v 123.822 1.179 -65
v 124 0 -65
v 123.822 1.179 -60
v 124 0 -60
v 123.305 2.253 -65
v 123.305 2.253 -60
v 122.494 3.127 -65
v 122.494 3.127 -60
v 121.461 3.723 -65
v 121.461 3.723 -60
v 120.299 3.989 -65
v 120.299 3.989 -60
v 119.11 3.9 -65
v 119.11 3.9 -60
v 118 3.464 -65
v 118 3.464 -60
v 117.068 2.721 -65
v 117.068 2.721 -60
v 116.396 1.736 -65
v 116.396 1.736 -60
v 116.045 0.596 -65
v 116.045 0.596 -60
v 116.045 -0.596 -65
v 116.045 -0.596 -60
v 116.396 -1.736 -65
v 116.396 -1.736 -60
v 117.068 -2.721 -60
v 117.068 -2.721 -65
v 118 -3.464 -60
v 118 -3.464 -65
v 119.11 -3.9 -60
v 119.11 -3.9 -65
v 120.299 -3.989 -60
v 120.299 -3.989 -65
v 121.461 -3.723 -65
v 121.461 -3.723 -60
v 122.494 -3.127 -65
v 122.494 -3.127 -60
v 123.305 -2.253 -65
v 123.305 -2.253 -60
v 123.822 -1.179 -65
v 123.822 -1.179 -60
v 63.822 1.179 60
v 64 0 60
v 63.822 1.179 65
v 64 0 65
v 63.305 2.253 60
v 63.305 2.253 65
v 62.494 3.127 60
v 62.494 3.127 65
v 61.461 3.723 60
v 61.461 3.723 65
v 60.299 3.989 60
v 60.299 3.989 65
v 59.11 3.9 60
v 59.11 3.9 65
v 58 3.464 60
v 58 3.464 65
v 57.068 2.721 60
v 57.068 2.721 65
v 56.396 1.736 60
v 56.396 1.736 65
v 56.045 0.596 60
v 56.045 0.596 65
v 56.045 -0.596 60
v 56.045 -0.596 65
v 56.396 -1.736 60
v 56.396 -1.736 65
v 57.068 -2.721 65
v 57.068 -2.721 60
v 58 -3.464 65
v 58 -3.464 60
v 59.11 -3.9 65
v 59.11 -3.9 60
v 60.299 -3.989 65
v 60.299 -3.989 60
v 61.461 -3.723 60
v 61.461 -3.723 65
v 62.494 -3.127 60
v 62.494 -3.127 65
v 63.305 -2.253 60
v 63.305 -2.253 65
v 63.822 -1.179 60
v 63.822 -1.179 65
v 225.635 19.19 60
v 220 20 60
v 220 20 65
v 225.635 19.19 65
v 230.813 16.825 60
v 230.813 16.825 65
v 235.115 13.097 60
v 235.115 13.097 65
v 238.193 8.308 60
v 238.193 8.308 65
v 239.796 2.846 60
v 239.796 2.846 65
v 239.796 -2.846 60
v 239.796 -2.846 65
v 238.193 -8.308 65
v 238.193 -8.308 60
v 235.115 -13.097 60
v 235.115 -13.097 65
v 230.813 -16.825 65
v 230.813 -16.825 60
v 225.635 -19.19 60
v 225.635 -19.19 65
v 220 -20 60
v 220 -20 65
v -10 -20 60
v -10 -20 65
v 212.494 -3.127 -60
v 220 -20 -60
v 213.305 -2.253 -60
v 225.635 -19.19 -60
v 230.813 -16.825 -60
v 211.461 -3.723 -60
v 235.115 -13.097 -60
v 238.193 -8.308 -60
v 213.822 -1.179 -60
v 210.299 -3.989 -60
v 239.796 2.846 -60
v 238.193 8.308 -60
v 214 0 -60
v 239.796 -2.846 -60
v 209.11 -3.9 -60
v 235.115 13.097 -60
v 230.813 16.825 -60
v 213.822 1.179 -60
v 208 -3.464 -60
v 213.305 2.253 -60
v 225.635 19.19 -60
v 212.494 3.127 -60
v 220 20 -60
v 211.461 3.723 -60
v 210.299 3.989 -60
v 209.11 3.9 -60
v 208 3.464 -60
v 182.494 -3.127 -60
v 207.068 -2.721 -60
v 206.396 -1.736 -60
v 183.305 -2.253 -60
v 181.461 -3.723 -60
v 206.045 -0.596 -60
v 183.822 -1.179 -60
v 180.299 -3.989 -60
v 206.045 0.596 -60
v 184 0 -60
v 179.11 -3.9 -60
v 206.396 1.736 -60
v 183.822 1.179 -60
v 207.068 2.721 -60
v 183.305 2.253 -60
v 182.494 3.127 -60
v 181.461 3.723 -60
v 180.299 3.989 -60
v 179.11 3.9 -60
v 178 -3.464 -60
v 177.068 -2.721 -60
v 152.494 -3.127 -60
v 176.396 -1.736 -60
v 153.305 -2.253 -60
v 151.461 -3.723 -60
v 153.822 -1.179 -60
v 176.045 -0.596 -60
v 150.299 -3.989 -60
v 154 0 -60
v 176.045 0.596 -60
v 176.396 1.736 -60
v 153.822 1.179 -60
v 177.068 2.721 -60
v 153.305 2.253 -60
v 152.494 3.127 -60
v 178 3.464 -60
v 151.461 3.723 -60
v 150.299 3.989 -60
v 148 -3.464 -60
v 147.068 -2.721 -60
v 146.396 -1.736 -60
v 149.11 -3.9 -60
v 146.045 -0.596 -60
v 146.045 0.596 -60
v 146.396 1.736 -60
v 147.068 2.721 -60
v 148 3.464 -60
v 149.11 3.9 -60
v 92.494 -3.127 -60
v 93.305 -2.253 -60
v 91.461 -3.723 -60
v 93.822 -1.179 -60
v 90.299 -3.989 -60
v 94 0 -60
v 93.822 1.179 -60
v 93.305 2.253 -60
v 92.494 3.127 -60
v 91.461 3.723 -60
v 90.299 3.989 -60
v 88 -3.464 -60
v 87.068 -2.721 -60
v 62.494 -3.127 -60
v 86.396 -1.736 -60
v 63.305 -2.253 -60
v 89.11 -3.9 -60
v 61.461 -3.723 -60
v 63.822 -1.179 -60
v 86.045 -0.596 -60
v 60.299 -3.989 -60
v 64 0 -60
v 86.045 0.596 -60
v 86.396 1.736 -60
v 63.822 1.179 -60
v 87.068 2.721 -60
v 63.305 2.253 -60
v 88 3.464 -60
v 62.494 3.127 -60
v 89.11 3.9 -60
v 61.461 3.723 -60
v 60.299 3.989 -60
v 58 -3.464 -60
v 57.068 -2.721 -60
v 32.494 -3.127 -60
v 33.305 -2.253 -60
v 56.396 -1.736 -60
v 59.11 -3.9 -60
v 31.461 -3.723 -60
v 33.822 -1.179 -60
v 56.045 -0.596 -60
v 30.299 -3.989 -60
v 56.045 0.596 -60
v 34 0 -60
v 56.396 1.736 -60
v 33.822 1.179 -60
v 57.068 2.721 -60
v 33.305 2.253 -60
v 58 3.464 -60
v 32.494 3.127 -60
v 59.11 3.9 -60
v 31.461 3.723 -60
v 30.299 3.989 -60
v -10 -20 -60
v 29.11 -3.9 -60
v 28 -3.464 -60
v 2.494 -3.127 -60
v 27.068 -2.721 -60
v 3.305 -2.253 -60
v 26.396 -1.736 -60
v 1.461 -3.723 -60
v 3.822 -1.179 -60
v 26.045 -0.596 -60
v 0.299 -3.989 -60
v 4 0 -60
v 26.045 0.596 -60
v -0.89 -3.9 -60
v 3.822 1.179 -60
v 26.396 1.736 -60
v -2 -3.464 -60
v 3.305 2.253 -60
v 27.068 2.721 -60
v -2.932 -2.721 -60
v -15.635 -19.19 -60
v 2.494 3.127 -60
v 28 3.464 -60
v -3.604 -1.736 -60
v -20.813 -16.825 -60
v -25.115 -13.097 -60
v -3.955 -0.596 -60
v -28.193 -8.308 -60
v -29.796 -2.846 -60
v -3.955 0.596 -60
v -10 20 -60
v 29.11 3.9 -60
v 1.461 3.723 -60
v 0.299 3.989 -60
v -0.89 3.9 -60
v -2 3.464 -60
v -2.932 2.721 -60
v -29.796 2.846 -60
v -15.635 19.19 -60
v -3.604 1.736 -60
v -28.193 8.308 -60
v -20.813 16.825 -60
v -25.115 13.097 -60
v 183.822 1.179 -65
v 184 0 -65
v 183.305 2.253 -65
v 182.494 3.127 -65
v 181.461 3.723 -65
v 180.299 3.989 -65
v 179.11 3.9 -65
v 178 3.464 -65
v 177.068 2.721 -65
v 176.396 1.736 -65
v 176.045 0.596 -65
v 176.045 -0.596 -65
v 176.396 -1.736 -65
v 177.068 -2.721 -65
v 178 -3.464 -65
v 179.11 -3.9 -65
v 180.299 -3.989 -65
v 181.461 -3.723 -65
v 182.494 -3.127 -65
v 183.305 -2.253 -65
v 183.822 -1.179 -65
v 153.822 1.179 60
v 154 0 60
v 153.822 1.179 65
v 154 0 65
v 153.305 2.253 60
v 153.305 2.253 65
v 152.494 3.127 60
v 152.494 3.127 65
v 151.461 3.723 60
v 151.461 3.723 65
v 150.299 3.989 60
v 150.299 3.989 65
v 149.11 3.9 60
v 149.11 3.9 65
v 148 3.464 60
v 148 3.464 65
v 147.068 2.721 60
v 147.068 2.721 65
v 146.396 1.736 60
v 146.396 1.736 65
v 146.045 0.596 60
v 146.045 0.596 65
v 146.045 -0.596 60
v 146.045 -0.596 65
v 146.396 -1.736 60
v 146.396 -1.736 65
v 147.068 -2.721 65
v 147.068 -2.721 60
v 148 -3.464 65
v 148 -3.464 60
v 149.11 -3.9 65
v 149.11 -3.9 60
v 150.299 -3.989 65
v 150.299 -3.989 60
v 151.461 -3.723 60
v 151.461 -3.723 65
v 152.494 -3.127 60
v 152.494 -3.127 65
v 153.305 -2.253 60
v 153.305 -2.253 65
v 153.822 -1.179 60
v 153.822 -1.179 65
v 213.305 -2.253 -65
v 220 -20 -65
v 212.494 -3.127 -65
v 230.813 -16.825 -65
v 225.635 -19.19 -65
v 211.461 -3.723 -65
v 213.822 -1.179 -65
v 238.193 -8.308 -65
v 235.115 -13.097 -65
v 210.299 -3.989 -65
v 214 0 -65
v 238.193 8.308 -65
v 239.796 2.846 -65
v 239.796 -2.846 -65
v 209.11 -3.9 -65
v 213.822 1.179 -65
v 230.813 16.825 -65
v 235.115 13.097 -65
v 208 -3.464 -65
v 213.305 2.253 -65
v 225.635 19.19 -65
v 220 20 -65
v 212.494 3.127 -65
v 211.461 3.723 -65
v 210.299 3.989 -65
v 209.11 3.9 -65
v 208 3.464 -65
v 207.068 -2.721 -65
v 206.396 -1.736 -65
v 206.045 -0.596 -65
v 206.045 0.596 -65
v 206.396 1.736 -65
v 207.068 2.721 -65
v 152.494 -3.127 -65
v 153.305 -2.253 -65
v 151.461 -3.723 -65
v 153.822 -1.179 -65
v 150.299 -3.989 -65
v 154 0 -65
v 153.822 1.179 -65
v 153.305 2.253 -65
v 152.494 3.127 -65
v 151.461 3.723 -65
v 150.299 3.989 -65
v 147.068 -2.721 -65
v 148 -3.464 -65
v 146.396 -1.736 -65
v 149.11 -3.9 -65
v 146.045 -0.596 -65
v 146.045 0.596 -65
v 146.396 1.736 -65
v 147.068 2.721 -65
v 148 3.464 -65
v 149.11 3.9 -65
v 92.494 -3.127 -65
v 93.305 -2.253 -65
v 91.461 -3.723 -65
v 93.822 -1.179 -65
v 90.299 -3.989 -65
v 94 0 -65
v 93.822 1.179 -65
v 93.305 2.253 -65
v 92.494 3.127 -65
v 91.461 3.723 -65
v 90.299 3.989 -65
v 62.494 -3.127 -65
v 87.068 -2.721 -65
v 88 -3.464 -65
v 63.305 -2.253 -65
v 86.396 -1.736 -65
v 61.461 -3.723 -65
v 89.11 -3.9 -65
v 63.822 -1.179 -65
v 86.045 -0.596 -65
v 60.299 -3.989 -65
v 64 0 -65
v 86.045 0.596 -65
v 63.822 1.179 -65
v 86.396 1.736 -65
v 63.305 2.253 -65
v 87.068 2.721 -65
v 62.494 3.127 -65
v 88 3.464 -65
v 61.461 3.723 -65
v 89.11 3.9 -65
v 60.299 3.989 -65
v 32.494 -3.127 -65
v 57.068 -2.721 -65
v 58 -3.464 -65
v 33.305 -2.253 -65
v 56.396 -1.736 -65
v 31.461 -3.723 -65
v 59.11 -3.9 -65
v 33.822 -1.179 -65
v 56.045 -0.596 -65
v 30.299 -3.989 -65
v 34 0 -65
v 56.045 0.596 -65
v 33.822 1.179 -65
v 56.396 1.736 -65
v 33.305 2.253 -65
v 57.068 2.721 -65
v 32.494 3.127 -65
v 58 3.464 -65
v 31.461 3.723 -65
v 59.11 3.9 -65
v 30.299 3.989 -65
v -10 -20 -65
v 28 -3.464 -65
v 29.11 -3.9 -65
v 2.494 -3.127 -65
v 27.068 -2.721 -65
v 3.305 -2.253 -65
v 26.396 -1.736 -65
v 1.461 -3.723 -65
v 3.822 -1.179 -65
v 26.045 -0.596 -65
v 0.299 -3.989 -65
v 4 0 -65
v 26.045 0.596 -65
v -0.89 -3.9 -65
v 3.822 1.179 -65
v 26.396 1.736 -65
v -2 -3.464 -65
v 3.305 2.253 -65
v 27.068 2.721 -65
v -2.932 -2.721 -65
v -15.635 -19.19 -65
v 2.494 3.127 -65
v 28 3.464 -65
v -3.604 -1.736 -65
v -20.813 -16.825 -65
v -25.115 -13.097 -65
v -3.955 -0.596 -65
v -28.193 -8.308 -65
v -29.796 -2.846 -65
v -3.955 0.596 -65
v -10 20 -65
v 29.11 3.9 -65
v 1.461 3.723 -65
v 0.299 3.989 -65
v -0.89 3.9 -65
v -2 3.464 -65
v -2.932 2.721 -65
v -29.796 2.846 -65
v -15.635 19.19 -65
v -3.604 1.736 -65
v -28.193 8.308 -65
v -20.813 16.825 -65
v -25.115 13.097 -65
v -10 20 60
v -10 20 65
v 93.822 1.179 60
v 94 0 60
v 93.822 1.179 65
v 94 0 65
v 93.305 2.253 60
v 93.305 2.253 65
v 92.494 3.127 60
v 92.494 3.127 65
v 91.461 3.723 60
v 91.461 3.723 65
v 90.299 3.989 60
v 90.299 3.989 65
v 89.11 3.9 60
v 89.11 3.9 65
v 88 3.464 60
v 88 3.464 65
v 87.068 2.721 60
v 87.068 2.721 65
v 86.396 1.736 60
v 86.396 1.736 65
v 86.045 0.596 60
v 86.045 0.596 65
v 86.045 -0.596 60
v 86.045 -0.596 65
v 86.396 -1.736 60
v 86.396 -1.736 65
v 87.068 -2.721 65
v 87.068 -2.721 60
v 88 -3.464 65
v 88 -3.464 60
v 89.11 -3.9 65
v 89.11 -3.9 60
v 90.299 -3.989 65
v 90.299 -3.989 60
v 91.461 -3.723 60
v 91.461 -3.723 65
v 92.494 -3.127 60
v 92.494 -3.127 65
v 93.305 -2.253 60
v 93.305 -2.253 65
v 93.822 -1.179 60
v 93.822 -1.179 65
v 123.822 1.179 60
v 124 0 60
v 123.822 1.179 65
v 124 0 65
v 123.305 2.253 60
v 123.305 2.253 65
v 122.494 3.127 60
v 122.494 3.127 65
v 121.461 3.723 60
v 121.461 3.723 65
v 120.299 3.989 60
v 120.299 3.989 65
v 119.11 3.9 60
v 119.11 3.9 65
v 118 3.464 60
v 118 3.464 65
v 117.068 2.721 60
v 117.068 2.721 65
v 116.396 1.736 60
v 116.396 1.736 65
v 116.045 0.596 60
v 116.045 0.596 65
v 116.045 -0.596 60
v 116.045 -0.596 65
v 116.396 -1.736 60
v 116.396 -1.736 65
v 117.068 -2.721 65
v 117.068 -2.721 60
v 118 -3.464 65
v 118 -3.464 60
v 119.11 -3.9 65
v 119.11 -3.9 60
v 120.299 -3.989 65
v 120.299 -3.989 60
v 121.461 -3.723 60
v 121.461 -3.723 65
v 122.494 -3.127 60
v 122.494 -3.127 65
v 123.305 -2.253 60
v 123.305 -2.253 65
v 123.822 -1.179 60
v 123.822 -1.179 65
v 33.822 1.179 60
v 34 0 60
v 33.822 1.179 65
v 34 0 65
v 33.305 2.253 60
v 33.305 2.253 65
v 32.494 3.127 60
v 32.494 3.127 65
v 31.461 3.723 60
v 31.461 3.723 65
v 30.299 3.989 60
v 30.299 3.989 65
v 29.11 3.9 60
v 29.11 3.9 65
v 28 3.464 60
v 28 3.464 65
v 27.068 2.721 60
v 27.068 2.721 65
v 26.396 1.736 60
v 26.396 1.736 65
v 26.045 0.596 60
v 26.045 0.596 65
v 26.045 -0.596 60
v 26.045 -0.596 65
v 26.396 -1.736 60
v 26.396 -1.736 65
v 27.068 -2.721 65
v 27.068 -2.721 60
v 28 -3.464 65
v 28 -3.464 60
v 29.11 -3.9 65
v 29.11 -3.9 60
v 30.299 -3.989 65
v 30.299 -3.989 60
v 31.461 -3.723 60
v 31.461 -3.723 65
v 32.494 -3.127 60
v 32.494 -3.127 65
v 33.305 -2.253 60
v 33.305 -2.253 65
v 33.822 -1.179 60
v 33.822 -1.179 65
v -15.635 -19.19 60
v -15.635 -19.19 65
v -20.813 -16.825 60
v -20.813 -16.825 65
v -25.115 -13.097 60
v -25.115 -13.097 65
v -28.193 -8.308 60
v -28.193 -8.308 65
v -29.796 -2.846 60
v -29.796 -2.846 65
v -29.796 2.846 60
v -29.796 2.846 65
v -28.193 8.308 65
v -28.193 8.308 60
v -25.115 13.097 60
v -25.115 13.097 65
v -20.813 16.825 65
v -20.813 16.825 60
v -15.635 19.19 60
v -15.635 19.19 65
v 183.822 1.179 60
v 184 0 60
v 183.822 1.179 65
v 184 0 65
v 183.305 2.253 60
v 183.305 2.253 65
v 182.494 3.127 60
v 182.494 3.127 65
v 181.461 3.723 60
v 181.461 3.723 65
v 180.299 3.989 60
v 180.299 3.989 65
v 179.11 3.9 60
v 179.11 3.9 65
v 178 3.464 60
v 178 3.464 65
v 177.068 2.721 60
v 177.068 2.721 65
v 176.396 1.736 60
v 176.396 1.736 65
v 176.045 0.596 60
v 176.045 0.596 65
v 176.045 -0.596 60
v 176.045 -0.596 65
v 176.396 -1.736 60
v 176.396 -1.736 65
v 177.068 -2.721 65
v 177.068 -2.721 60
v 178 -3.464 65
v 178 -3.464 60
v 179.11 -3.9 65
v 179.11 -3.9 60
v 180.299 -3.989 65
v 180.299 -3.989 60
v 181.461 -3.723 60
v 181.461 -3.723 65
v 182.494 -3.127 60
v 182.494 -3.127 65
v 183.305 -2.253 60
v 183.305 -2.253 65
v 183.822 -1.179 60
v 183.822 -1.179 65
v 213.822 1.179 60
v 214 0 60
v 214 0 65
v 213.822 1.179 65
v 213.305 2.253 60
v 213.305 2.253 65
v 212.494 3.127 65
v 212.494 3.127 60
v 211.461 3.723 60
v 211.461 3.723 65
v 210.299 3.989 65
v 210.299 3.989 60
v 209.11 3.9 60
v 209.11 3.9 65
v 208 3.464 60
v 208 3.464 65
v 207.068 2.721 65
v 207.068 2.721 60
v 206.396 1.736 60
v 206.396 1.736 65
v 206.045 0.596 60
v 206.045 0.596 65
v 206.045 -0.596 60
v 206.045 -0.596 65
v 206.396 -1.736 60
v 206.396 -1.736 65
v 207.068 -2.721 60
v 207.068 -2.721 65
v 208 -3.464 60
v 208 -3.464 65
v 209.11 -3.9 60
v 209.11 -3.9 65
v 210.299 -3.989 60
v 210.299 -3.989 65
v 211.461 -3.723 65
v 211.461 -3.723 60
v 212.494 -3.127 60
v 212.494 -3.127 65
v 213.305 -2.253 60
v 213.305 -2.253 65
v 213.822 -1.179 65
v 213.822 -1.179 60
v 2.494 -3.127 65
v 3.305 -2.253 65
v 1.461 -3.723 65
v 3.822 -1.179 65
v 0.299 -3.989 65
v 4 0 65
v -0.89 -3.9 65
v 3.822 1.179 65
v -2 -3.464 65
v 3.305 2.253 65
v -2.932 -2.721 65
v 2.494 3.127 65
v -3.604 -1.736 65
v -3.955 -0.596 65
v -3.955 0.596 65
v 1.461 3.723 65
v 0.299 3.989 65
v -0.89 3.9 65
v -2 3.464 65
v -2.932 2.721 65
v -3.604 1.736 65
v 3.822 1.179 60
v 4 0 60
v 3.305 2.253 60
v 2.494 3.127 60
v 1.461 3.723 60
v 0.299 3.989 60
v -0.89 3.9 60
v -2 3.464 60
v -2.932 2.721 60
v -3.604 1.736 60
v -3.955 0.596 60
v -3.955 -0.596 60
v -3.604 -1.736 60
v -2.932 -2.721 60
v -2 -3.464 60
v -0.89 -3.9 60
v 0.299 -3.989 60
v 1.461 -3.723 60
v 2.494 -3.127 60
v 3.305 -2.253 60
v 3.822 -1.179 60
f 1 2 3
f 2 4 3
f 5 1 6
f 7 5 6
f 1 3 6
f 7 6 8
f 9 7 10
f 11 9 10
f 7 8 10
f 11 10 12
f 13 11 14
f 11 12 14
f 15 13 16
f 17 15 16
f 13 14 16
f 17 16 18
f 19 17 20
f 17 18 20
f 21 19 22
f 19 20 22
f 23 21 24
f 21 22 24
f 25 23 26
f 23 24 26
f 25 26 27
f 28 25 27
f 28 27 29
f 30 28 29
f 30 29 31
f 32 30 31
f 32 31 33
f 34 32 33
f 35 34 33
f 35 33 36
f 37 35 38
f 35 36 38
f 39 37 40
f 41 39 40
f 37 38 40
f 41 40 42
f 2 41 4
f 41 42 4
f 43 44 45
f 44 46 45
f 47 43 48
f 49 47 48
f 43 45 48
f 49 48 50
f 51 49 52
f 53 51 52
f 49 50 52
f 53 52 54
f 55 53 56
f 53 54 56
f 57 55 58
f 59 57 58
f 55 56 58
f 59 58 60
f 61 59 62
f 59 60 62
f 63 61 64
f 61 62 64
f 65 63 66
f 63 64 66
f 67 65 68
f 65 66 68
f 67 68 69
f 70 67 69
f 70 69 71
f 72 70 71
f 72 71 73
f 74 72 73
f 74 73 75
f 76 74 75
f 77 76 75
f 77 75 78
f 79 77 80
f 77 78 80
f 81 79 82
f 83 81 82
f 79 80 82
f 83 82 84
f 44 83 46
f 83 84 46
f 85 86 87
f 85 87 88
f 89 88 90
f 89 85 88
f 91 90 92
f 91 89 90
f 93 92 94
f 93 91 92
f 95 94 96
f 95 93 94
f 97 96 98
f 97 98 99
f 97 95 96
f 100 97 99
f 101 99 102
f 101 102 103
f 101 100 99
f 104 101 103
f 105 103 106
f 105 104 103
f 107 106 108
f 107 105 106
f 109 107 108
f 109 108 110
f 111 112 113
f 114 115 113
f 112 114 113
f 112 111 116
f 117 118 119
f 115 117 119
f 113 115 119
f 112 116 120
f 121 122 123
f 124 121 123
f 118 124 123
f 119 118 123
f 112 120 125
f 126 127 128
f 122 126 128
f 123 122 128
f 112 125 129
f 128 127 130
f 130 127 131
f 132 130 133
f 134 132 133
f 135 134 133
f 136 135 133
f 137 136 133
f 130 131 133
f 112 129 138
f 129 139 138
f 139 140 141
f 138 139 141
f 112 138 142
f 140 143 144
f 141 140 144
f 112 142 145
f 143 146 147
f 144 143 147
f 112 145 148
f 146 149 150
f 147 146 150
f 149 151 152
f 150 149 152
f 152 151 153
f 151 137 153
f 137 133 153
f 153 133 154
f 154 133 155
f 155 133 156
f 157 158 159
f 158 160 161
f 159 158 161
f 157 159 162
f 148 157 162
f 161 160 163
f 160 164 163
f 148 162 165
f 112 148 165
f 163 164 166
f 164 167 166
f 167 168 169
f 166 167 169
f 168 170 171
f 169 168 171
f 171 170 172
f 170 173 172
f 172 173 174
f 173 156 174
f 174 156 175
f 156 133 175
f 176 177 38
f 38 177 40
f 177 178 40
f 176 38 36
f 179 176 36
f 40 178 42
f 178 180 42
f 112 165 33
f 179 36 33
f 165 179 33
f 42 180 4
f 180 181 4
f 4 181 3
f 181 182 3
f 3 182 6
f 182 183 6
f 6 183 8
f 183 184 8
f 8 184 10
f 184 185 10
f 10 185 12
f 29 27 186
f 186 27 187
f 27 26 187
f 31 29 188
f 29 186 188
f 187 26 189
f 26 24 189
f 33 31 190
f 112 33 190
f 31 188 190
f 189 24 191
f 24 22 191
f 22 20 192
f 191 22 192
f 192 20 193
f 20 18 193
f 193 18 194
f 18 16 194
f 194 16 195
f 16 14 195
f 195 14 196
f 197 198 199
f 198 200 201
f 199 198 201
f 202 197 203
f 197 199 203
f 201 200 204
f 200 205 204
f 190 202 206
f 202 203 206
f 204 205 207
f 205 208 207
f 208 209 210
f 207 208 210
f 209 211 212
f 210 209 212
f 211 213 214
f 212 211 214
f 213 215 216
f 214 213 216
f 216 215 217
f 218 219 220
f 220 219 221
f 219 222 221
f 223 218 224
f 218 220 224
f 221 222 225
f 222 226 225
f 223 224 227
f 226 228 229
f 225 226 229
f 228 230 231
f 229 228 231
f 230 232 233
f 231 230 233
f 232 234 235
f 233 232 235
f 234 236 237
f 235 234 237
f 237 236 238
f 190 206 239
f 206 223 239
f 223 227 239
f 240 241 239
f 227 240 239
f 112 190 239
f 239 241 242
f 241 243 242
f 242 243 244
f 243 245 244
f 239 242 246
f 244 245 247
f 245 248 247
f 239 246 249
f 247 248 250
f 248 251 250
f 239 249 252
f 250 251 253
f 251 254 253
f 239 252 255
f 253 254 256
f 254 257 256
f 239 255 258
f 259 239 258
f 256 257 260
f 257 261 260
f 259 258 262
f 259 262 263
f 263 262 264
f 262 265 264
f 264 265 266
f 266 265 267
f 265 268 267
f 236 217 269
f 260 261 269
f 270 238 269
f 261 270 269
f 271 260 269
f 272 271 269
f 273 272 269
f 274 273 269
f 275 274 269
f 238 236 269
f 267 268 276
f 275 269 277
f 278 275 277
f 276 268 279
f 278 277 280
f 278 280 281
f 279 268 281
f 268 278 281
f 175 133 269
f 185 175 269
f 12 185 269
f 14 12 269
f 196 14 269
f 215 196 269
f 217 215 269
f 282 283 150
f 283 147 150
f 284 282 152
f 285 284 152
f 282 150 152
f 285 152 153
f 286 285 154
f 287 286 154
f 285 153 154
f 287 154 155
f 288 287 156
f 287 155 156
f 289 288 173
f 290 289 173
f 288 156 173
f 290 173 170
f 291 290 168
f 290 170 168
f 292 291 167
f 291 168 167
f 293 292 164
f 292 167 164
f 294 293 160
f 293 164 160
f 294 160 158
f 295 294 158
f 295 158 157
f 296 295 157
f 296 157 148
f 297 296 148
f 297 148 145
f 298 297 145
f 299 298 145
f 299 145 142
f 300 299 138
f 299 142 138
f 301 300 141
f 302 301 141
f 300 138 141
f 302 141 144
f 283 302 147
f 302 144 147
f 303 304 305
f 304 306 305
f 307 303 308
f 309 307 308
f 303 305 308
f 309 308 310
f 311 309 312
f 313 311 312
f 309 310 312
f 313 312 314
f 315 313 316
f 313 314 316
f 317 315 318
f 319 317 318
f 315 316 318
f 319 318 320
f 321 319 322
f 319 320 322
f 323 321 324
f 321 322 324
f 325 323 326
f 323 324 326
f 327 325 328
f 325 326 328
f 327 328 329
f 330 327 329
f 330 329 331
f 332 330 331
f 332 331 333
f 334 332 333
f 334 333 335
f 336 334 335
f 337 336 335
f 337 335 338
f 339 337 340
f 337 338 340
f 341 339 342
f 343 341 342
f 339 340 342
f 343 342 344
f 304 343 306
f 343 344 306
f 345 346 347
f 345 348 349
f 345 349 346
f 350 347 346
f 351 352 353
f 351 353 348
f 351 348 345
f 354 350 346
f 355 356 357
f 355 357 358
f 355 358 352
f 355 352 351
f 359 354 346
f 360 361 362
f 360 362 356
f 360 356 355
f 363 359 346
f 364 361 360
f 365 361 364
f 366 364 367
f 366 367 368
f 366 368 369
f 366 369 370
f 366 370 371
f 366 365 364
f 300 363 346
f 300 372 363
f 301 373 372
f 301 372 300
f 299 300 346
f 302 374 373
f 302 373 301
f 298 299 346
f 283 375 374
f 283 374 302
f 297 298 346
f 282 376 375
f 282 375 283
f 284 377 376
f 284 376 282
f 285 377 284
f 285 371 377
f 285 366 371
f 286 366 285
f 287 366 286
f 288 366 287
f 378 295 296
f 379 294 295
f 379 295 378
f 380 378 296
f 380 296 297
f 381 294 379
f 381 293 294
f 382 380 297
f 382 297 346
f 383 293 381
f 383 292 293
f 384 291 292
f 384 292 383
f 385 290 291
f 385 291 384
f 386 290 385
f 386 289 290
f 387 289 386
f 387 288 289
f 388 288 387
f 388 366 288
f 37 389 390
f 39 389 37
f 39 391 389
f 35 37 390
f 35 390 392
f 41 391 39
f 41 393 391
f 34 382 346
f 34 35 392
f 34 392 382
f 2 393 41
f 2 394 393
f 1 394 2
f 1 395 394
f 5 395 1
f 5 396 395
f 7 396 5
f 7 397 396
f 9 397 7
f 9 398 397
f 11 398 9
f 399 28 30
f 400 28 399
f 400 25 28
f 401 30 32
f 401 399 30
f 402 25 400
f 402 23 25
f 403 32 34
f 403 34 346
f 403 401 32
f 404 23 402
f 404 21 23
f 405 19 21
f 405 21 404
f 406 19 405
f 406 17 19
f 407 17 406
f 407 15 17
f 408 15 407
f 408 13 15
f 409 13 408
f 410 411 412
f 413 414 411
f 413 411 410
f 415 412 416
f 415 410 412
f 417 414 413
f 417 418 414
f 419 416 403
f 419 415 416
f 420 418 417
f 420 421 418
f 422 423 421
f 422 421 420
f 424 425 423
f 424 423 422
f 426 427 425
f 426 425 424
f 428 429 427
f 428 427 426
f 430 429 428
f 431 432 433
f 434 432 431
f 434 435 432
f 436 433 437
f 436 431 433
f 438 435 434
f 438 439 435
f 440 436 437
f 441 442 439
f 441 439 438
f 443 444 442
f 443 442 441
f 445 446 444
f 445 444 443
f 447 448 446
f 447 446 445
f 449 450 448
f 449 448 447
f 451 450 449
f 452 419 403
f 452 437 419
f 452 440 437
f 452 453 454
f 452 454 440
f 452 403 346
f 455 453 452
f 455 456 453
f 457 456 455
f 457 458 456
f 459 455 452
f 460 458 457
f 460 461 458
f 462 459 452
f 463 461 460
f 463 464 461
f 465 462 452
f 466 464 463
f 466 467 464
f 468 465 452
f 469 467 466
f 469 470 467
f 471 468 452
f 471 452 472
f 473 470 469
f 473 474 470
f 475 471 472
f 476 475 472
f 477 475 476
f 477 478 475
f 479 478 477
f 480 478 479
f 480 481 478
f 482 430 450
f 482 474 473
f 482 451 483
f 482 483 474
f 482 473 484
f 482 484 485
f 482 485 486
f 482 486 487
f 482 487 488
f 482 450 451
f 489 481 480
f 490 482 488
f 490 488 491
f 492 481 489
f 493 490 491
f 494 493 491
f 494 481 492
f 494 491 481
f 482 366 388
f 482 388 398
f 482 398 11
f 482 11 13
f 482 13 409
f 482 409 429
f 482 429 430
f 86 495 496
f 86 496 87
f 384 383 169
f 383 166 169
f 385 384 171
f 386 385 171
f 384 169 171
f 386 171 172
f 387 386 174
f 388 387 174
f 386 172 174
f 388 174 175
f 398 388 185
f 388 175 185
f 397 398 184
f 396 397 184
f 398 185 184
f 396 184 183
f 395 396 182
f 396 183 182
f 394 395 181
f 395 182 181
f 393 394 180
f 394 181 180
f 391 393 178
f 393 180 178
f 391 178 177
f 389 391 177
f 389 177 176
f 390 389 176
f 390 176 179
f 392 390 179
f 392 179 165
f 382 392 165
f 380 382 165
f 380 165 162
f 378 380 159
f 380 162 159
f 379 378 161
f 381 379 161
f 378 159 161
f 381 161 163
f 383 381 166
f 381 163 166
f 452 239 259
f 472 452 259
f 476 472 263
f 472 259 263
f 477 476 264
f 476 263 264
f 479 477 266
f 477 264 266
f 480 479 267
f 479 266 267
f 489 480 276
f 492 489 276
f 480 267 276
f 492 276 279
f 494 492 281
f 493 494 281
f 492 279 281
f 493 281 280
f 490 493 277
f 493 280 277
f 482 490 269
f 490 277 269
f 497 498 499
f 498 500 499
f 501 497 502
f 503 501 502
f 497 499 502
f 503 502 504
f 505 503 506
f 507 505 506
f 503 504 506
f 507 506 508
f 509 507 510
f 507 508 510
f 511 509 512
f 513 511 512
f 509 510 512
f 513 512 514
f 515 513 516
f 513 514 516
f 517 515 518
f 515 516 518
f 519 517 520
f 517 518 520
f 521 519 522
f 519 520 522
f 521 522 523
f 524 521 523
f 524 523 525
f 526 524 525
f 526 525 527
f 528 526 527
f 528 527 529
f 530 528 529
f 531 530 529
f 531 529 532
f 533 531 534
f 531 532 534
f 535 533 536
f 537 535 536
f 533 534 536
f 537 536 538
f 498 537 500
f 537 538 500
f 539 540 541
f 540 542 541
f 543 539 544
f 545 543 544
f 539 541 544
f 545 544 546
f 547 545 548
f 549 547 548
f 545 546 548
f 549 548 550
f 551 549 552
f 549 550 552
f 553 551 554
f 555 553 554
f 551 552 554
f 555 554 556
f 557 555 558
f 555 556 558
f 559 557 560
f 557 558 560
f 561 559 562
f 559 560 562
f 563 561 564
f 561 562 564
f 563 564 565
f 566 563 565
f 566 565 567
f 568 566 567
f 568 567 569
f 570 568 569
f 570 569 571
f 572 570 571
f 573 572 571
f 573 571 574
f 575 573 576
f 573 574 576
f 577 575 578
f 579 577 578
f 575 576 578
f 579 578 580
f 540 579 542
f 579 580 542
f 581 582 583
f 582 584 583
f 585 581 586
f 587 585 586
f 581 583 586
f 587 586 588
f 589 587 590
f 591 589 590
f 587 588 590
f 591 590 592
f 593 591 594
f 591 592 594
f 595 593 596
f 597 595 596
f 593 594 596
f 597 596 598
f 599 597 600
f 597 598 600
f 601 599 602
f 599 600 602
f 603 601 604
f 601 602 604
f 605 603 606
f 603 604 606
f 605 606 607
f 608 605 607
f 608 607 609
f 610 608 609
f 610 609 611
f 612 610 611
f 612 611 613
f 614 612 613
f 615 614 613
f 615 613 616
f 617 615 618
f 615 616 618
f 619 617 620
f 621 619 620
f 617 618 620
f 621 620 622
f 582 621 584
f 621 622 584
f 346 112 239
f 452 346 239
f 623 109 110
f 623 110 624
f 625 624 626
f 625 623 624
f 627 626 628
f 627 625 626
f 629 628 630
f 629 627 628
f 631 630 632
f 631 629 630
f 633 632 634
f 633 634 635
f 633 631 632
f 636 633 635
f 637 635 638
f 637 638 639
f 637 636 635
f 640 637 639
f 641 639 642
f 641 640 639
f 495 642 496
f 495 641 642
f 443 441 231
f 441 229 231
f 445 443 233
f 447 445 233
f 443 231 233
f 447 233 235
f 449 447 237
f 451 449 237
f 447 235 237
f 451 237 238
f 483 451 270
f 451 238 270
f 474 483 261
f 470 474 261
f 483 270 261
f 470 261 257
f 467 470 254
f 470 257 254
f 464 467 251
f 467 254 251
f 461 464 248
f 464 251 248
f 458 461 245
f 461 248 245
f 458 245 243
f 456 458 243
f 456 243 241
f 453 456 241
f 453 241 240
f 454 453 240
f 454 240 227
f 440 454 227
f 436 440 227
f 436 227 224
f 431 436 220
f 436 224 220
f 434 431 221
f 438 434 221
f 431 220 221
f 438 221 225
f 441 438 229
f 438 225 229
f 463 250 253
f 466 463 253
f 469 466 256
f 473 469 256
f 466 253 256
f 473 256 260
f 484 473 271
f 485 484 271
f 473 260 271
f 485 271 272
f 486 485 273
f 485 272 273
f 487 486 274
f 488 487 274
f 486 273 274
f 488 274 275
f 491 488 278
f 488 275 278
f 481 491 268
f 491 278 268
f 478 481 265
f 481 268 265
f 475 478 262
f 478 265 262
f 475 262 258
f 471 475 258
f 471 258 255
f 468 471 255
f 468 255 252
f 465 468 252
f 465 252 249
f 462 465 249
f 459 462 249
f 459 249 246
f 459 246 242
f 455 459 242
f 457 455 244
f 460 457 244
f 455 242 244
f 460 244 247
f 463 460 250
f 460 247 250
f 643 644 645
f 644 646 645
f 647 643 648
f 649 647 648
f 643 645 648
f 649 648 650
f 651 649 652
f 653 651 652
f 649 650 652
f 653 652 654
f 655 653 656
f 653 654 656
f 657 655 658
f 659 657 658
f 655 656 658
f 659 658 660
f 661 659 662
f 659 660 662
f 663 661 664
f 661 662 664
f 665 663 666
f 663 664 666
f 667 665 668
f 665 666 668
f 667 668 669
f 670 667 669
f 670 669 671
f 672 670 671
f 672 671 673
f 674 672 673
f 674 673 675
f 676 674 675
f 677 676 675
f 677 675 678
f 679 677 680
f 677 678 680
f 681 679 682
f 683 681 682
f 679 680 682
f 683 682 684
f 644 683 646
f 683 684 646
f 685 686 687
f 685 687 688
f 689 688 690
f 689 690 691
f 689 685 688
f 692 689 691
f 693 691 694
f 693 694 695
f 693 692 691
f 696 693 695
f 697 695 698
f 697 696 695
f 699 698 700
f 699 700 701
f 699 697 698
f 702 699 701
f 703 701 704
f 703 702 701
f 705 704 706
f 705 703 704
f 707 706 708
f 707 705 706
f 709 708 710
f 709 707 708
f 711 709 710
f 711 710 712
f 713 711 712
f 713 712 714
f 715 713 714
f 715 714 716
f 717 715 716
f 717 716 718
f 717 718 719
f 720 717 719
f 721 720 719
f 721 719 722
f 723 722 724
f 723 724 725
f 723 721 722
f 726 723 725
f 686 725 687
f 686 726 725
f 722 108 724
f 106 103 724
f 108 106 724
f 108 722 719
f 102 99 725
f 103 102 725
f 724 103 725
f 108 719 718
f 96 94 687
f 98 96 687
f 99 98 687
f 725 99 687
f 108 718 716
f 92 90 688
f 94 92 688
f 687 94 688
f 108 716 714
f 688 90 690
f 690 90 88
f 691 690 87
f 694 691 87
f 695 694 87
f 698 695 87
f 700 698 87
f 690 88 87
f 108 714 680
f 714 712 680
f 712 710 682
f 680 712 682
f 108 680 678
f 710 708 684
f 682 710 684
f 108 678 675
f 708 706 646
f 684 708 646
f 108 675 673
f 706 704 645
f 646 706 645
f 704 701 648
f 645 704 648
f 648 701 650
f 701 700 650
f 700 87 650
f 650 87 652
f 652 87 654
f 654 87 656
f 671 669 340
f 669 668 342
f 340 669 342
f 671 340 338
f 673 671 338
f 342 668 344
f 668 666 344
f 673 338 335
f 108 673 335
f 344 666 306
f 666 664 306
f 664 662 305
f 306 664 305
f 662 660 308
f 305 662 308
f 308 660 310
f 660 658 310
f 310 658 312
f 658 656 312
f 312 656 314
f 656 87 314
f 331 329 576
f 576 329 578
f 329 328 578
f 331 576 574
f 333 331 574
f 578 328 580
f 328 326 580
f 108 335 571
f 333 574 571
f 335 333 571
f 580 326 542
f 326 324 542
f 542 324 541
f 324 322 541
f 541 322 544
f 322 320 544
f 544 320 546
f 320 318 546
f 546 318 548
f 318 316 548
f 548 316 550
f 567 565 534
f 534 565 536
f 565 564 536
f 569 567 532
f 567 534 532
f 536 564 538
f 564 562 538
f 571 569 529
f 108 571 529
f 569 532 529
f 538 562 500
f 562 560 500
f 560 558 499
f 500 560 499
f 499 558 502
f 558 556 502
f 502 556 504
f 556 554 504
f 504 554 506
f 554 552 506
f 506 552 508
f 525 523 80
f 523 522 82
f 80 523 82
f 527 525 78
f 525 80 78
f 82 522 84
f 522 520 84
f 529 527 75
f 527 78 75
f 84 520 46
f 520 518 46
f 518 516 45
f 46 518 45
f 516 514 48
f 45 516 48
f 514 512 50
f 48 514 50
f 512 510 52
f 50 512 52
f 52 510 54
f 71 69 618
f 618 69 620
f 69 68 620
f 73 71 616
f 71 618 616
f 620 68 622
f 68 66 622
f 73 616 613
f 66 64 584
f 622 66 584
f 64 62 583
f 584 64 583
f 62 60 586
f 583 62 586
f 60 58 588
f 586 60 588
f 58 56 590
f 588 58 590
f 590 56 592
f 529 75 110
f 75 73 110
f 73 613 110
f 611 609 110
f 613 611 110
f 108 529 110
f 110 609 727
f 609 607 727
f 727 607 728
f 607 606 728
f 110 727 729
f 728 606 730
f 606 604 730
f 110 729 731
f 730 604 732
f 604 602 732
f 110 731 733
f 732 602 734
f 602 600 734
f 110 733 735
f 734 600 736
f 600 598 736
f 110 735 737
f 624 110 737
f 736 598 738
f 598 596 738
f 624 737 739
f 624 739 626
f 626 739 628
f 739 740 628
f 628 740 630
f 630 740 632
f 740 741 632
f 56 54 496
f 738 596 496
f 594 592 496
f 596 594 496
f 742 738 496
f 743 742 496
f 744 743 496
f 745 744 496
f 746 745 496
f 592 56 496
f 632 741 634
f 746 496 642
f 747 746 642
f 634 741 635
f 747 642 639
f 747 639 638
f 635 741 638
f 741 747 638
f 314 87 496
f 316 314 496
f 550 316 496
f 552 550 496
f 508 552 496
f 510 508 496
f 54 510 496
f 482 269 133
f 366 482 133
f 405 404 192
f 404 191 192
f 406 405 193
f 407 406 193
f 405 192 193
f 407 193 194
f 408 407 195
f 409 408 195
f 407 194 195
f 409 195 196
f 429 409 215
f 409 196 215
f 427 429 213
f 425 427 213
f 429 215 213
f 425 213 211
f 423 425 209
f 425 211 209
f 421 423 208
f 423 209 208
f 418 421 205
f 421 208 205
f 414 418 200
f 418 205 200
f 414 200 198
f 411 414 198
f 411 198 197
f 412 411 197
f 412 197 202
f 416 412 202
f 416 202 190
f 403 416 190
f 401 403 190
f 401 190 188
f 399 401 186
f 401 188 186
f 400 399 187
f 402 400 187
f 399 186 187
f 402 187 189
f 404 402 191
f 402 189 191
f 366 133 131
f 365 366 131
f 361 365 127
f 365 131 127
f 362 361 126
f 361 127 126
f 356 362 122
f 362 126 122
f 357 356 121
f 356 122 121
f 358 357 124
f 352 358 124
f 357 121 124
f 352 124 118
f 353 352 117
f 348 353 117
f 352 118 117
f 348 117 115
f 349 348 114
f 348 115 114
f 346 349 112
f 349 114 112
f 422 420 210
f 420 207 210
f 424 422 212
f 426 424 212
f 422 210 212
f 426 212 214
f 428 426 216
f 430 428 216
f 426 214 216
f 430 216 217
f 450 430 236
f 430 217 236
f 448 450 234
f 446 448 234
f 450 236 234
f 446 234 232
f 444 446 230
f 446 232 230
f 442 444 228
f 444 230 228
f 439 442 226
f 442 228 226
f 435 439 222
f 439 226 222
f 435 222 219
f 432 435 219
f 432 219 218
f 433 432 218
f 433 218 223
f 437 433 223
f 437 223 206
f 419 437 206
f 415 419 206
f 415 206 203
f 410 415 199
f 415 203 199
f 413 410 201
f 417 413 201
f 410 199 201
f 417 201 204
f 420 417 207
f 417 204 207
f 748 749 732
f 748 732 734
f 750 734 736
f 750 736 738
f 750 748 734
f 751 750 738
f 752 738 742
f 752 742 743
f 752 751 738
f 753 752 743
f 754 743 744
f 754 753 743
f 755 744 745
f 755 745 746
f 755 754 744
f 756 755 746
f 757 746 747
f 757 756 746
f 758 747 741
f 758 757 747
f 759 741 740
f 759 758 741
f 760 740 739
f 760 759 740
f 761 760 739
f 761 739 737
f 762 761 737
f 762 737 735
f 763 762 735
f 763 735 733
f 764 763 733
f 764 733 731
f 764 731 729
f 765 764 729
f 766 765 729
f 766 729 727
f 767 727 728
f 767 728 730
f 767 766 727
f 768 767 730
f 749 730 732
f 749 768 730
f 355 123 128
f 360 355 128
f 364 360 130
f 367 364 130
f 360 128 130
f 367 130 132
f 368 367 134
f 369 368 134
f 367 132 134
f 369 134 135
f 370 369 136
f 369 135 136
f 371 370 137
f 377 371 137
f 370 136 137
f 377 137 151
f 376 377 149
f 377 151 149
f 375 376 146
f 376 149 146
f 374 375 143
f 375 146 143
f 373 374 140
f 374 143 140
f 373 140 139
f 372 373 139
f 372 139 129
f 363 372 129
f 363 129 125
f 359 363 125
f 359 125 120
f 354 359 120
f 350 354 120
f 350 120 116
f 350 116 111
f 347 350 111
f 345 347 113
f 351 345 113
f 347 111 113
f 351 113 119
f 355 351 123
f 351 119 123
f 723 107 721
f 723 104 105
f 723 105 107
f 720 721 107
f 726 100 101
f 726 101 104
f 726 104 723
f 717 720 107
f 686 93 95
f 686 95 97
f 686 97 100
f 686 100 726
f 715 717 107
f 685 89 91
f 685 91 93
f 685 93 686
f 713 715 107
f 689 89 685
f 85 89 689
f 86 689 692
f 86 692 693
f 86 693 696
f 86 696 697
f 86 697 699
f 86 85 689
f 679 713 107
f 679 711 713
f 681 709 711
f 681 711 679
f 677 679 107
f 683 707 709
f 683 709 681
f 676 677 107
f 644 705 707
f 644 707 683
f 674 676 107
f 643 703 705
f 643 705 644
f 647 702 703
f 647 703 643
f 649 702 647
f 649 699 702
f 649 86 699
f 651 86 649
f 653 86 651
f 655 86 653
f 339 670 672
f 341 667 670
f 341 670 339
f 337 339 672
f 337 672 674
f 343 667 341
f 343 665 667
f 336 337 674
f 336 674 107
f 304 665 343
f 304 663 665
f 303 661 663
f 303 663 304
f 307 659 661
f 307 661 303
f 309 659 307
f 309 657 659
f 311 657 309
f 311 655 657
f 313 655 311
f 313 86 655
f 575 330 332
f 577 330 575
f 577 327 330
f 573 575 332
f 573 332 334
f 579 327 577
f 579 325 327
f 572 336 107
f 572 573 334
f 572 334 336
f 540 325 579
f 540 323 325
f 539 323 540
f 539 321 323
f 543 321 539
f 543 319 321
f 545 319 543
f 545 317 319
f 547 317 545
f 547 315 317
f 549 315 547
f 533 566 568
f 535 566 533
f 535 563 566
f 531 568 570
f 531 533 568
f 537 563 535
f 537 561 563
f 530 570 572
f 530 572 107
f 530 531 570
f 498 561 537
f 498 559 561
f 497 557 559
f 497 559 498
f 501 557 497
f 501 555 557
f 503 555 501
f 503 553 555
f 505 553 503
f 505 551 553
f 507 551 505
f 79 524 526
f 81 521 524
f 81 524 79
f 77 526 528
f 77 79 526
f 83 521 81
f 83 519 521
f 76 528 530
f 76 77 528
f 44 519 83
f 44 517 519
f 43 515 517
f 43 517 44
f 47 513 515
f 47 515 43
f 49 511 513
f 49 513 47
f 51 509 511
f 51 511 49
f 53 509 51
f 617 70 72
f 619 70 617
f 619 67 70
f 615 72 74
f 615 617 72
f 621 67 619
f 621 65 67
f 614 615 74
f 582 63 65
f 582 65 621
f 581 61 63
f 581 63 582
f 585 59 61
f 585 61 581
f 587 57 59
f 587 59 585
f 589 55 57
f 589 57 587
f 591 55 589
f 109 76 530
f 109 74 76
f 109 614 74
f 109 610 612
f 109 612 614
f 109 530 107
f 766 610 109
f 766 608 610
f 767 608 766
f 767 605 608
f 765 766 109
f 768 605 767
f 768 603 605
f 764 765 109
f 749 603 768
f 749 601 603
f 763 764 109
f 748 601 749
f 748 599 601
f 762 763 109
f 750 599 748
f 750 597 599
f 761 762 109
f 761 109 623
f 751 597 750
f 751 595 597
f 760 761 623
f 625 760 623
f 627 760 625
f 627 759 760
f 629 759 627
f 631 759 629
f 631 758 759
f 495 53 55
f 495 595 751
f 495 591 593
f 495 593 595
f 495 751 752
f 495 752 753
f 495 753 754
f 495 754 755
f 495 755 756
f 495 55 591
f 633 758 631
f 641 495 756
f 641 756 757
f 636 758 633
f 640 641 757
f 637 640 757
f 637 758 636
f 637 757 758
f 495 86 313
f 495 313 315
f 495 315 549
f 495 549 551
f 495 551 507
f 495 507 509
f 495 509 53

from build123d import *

# Parameters (mm, degrees)
SKETCH2_R               = 4
BOSS_EXTRUDE1_DEPTH     = 5
SKETCH3_R               = 4
CUT_EXTRUDE1_DEPTH      = 66
CUT_EXTRUDE1_DEPTH_BACK = 66


with BuildPart() as part:
    # Sketch2 → Boss-Extrude1 (new body)
    with BuildSketch(Plane.XY.offset(60)):
        with BuildLine():
            Line((-10, 20), (220, 20))
            ThreePointArc((220, 20), (240, 0), (220, -20))
            Line((220, -20), (-10, -20))
            ThreePointArc((-10, -20), (-30, 0), (-10, 20))
        make_face()
        Circle(SKETCH2_R, mode=Mode.SUBTRACT)
        with Locations((210, 0)):
            Circle(SKETCH2_R, mode=Mode.SUBTRACT)
    extrude(amount=BOSS_EXTRUDE1_DEPTH)


with BuildPart() as body_2:
    # Mirror5: mirrored copy
    add(part.part.mirror(Plane.XY))


with BuildPart() as cut_extrude1_tool:
    # Sketch3 → Cut-Extrude1 (new body, two sides)
    with BuildSketch(Plane.XY) as cut_extrude1_sk:
        with Locations((210, 0)):
            Circle(SKETCH3_R)
        with Locations((180, 0)):
            Circle(SKETCH3_R)
        with Locations((150, 0)):
            Circle(SKETCH3_R)
        with Locations((120, 0)):
            Circle(SKETCH3_R)
        with Locations((90, 0)):
            Circle(SKETCH3_R)
        with Locations((60, 0)):
            Circle(SKETCH3_R)
        with Locations((30, 0)):
            Circle(SKETCH3_R)
        Circle(SKETCH3_R)
    extrude(amount=CUT_EXTRUDE1_DEPTH)
    extrude(cut_extrude1_sk.sketch, amount=-CUT_EXTRUDE1_DEPTH_BACK)


with BuildPart() as part_1:
    add(part.part)

    # Cut-Extrude1: cut by cut_extrude1_tool
    add(cut_extrude1_tool.part, mode=Mode.SUBTRACT)


with BuildPart() as body_2_1:
    add(body_2.part)

    # Cut-Extrude1: cut by cut_extrude1_tool
    add(cut_extrude1_tool.part, mode=Mode.SUBTRACT)


solid = Compound([part_1.part, body_2_1.part])
